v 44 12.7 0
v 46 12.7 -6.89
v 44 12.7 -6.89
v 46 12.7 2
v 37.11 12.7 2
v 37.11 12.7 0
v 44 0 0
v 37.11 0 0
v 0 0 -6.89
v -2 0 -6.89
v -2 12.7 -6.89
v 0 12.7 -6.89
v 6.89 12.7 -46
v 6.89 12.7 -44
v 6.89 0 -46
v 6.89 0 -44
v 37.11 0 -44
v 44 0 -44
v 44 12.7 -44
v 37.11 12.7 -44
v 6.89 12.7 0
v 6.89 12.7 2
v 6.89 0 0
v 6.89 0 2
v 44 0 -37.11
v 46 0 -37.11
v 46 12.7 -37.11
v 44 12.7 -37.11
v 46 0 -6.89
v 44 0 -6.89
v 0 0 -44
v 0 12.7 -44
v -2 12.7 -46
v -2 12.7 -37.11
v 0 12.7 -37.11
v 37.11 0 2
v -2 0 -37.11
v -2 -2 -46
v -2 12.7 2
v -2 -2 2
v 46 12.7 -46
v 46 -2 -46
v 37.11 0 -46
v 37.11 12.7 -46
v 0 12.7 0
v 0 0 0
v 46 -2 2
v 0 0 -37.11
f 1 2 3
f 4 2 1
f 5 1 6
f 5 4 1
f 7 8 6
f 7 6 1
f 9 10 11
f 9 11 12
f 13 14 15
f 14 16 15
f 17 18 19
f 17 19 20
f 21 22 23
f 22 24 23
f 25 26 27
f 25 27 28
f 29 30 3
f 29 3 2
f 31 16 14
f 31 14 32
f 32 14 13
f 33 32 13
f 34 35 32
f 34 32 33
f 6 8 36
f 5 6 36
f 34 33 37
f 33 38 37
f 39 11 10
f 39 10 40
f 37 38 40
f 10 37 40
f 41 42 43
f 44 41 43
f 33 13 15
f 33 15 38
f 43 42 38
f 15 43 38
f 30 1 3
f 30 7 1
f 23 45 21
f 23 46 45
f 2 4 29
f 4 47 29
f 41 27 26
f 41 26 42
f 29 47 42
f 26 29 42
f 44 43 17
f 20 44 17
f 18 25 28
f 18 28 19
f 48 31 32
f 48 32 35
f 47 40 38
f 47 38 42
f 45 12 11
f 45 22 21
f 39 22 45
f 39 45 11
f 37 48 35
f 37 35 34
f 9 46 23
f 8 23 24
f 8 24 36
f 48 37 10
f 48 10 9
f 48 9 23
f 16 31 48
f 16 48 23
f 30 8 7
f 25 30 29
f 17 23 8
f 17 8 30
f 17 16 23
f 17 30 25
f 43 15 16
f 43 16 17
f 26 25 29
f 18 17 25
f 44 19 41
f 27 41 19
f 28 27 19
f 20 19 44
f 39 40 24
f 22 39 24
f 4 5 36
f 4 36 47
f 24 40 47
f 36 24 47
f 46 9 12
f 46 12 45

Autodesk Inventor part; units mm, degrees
ref_plane "YZ Plane" through (0, 0, 0) normal (1, 0, 0) x (0, 1, 0)
ref_plane "XZ Plane" through (0, 0, 0) normal (0, 1, 0) x (-1, 0, 0)
ref_plane "XY Plane" through (0, 0, 0) normal (0, 0, 1) x (1, 0, 0)
sketch "Sketch1" plane through (0, 0, 0) normal (0, 1, 0) x (-1, 0, 0)
  line L0 (0, 0) -> (-44, 0)
  line L1 (-44, 0) -> (-44, -44)
  line L2 (-44, -44) -> (0, -44)
  line L3 (0, -44) -> (0, 0)
  line L4 (2, 2) -> (-46, 2)
  line L5 (-46, 2) -> (-46, -46)
  line L6 (-46, -46) -> (2, -46)
  line L7 (2, -46) -> (2, 2)
  dimension "d0" = 44
  dimension "d1" = 44
  dimension "d2" = 48
  dimension "d3" = 48
  dimension "d4" = 2
  dimension "d5" = 2
extrude "Extrusion1" add sketch "Sketch1" along normal blind 12.7
sketch "Sketch2" plane through (0, 0, 0) normal (0, -1, 0) x (1, 0, 0)
  line L0 (46, 2) -> (46, -46) projected
  line L1 (-2, 2) -> (46, 2) projected
  line L2 (-2, -46) -> (-2, 2) projected
  line L3 (46, -46) -> (-2, -46) projected
  point P0 (0, 0)
extrude "Extrusion2" add sketch "Sketch2" along normal blind 2
sketch "Sketch3" plane through (0, 0, 0) normal (0, 1, 0) x (1, 0, 0)
  line L0 (-2, -2) -> (46, -2) projected
  line L1 (-2, 46) -> (-2, -2) projected
  line L2 (46, 46) -> (-2, 46) projected
  line L3 (46, -2) -> (46, 46) projected
  line L4 (37.11, -2) -> (6.89, -2)
  line L5 (6.89, -2) -> (6.89, 46)
  line L6 (6.89, 46) -> (37.11, 46)
  line L7 (37.11, 46) -> (37.11, -2)
  line L8 (-2, -2) -> (-2, 46) projected
  line L9 (-2, 6.89) -> (46, 6.89)
  line L10 (46, 6.89) -> (46, 37.11)
  line L11 (46, 37.11) -> (-2, 37.11)
  line L12 (-2, 37.11) -> (-2, 6.89)
  point P0 (0, 0)
  point P1 (37.11, 37.11)
  point P2 (37.11, 6.89)
  point P3 (6.89, 6.89)
  point P4 (6.89, 37.11)
  point P5 (-2, 37.11)
  dimension "d10" = 8.89
  dimension "d11" = 8.89
  dimension "d12" = 8.89
  dimension "d13" = 8.89
extrude "Extrusion3" cut sketch "Sketch3" along normal blind 2 contours L5 L9 L7 L0 | L1 L11 L5 L9 | L7 L11 L3 L9 | L5 L2 L7 L11
extrude "Extrusion4" cut sketch "Sketch3" along normal blind 76.2 contours L5 L9 L7 L0 | L1 L11 L5 L9 | L7 L11 L3 L9 | L5 L2 L7 L11
properties part number "servoBracket"
